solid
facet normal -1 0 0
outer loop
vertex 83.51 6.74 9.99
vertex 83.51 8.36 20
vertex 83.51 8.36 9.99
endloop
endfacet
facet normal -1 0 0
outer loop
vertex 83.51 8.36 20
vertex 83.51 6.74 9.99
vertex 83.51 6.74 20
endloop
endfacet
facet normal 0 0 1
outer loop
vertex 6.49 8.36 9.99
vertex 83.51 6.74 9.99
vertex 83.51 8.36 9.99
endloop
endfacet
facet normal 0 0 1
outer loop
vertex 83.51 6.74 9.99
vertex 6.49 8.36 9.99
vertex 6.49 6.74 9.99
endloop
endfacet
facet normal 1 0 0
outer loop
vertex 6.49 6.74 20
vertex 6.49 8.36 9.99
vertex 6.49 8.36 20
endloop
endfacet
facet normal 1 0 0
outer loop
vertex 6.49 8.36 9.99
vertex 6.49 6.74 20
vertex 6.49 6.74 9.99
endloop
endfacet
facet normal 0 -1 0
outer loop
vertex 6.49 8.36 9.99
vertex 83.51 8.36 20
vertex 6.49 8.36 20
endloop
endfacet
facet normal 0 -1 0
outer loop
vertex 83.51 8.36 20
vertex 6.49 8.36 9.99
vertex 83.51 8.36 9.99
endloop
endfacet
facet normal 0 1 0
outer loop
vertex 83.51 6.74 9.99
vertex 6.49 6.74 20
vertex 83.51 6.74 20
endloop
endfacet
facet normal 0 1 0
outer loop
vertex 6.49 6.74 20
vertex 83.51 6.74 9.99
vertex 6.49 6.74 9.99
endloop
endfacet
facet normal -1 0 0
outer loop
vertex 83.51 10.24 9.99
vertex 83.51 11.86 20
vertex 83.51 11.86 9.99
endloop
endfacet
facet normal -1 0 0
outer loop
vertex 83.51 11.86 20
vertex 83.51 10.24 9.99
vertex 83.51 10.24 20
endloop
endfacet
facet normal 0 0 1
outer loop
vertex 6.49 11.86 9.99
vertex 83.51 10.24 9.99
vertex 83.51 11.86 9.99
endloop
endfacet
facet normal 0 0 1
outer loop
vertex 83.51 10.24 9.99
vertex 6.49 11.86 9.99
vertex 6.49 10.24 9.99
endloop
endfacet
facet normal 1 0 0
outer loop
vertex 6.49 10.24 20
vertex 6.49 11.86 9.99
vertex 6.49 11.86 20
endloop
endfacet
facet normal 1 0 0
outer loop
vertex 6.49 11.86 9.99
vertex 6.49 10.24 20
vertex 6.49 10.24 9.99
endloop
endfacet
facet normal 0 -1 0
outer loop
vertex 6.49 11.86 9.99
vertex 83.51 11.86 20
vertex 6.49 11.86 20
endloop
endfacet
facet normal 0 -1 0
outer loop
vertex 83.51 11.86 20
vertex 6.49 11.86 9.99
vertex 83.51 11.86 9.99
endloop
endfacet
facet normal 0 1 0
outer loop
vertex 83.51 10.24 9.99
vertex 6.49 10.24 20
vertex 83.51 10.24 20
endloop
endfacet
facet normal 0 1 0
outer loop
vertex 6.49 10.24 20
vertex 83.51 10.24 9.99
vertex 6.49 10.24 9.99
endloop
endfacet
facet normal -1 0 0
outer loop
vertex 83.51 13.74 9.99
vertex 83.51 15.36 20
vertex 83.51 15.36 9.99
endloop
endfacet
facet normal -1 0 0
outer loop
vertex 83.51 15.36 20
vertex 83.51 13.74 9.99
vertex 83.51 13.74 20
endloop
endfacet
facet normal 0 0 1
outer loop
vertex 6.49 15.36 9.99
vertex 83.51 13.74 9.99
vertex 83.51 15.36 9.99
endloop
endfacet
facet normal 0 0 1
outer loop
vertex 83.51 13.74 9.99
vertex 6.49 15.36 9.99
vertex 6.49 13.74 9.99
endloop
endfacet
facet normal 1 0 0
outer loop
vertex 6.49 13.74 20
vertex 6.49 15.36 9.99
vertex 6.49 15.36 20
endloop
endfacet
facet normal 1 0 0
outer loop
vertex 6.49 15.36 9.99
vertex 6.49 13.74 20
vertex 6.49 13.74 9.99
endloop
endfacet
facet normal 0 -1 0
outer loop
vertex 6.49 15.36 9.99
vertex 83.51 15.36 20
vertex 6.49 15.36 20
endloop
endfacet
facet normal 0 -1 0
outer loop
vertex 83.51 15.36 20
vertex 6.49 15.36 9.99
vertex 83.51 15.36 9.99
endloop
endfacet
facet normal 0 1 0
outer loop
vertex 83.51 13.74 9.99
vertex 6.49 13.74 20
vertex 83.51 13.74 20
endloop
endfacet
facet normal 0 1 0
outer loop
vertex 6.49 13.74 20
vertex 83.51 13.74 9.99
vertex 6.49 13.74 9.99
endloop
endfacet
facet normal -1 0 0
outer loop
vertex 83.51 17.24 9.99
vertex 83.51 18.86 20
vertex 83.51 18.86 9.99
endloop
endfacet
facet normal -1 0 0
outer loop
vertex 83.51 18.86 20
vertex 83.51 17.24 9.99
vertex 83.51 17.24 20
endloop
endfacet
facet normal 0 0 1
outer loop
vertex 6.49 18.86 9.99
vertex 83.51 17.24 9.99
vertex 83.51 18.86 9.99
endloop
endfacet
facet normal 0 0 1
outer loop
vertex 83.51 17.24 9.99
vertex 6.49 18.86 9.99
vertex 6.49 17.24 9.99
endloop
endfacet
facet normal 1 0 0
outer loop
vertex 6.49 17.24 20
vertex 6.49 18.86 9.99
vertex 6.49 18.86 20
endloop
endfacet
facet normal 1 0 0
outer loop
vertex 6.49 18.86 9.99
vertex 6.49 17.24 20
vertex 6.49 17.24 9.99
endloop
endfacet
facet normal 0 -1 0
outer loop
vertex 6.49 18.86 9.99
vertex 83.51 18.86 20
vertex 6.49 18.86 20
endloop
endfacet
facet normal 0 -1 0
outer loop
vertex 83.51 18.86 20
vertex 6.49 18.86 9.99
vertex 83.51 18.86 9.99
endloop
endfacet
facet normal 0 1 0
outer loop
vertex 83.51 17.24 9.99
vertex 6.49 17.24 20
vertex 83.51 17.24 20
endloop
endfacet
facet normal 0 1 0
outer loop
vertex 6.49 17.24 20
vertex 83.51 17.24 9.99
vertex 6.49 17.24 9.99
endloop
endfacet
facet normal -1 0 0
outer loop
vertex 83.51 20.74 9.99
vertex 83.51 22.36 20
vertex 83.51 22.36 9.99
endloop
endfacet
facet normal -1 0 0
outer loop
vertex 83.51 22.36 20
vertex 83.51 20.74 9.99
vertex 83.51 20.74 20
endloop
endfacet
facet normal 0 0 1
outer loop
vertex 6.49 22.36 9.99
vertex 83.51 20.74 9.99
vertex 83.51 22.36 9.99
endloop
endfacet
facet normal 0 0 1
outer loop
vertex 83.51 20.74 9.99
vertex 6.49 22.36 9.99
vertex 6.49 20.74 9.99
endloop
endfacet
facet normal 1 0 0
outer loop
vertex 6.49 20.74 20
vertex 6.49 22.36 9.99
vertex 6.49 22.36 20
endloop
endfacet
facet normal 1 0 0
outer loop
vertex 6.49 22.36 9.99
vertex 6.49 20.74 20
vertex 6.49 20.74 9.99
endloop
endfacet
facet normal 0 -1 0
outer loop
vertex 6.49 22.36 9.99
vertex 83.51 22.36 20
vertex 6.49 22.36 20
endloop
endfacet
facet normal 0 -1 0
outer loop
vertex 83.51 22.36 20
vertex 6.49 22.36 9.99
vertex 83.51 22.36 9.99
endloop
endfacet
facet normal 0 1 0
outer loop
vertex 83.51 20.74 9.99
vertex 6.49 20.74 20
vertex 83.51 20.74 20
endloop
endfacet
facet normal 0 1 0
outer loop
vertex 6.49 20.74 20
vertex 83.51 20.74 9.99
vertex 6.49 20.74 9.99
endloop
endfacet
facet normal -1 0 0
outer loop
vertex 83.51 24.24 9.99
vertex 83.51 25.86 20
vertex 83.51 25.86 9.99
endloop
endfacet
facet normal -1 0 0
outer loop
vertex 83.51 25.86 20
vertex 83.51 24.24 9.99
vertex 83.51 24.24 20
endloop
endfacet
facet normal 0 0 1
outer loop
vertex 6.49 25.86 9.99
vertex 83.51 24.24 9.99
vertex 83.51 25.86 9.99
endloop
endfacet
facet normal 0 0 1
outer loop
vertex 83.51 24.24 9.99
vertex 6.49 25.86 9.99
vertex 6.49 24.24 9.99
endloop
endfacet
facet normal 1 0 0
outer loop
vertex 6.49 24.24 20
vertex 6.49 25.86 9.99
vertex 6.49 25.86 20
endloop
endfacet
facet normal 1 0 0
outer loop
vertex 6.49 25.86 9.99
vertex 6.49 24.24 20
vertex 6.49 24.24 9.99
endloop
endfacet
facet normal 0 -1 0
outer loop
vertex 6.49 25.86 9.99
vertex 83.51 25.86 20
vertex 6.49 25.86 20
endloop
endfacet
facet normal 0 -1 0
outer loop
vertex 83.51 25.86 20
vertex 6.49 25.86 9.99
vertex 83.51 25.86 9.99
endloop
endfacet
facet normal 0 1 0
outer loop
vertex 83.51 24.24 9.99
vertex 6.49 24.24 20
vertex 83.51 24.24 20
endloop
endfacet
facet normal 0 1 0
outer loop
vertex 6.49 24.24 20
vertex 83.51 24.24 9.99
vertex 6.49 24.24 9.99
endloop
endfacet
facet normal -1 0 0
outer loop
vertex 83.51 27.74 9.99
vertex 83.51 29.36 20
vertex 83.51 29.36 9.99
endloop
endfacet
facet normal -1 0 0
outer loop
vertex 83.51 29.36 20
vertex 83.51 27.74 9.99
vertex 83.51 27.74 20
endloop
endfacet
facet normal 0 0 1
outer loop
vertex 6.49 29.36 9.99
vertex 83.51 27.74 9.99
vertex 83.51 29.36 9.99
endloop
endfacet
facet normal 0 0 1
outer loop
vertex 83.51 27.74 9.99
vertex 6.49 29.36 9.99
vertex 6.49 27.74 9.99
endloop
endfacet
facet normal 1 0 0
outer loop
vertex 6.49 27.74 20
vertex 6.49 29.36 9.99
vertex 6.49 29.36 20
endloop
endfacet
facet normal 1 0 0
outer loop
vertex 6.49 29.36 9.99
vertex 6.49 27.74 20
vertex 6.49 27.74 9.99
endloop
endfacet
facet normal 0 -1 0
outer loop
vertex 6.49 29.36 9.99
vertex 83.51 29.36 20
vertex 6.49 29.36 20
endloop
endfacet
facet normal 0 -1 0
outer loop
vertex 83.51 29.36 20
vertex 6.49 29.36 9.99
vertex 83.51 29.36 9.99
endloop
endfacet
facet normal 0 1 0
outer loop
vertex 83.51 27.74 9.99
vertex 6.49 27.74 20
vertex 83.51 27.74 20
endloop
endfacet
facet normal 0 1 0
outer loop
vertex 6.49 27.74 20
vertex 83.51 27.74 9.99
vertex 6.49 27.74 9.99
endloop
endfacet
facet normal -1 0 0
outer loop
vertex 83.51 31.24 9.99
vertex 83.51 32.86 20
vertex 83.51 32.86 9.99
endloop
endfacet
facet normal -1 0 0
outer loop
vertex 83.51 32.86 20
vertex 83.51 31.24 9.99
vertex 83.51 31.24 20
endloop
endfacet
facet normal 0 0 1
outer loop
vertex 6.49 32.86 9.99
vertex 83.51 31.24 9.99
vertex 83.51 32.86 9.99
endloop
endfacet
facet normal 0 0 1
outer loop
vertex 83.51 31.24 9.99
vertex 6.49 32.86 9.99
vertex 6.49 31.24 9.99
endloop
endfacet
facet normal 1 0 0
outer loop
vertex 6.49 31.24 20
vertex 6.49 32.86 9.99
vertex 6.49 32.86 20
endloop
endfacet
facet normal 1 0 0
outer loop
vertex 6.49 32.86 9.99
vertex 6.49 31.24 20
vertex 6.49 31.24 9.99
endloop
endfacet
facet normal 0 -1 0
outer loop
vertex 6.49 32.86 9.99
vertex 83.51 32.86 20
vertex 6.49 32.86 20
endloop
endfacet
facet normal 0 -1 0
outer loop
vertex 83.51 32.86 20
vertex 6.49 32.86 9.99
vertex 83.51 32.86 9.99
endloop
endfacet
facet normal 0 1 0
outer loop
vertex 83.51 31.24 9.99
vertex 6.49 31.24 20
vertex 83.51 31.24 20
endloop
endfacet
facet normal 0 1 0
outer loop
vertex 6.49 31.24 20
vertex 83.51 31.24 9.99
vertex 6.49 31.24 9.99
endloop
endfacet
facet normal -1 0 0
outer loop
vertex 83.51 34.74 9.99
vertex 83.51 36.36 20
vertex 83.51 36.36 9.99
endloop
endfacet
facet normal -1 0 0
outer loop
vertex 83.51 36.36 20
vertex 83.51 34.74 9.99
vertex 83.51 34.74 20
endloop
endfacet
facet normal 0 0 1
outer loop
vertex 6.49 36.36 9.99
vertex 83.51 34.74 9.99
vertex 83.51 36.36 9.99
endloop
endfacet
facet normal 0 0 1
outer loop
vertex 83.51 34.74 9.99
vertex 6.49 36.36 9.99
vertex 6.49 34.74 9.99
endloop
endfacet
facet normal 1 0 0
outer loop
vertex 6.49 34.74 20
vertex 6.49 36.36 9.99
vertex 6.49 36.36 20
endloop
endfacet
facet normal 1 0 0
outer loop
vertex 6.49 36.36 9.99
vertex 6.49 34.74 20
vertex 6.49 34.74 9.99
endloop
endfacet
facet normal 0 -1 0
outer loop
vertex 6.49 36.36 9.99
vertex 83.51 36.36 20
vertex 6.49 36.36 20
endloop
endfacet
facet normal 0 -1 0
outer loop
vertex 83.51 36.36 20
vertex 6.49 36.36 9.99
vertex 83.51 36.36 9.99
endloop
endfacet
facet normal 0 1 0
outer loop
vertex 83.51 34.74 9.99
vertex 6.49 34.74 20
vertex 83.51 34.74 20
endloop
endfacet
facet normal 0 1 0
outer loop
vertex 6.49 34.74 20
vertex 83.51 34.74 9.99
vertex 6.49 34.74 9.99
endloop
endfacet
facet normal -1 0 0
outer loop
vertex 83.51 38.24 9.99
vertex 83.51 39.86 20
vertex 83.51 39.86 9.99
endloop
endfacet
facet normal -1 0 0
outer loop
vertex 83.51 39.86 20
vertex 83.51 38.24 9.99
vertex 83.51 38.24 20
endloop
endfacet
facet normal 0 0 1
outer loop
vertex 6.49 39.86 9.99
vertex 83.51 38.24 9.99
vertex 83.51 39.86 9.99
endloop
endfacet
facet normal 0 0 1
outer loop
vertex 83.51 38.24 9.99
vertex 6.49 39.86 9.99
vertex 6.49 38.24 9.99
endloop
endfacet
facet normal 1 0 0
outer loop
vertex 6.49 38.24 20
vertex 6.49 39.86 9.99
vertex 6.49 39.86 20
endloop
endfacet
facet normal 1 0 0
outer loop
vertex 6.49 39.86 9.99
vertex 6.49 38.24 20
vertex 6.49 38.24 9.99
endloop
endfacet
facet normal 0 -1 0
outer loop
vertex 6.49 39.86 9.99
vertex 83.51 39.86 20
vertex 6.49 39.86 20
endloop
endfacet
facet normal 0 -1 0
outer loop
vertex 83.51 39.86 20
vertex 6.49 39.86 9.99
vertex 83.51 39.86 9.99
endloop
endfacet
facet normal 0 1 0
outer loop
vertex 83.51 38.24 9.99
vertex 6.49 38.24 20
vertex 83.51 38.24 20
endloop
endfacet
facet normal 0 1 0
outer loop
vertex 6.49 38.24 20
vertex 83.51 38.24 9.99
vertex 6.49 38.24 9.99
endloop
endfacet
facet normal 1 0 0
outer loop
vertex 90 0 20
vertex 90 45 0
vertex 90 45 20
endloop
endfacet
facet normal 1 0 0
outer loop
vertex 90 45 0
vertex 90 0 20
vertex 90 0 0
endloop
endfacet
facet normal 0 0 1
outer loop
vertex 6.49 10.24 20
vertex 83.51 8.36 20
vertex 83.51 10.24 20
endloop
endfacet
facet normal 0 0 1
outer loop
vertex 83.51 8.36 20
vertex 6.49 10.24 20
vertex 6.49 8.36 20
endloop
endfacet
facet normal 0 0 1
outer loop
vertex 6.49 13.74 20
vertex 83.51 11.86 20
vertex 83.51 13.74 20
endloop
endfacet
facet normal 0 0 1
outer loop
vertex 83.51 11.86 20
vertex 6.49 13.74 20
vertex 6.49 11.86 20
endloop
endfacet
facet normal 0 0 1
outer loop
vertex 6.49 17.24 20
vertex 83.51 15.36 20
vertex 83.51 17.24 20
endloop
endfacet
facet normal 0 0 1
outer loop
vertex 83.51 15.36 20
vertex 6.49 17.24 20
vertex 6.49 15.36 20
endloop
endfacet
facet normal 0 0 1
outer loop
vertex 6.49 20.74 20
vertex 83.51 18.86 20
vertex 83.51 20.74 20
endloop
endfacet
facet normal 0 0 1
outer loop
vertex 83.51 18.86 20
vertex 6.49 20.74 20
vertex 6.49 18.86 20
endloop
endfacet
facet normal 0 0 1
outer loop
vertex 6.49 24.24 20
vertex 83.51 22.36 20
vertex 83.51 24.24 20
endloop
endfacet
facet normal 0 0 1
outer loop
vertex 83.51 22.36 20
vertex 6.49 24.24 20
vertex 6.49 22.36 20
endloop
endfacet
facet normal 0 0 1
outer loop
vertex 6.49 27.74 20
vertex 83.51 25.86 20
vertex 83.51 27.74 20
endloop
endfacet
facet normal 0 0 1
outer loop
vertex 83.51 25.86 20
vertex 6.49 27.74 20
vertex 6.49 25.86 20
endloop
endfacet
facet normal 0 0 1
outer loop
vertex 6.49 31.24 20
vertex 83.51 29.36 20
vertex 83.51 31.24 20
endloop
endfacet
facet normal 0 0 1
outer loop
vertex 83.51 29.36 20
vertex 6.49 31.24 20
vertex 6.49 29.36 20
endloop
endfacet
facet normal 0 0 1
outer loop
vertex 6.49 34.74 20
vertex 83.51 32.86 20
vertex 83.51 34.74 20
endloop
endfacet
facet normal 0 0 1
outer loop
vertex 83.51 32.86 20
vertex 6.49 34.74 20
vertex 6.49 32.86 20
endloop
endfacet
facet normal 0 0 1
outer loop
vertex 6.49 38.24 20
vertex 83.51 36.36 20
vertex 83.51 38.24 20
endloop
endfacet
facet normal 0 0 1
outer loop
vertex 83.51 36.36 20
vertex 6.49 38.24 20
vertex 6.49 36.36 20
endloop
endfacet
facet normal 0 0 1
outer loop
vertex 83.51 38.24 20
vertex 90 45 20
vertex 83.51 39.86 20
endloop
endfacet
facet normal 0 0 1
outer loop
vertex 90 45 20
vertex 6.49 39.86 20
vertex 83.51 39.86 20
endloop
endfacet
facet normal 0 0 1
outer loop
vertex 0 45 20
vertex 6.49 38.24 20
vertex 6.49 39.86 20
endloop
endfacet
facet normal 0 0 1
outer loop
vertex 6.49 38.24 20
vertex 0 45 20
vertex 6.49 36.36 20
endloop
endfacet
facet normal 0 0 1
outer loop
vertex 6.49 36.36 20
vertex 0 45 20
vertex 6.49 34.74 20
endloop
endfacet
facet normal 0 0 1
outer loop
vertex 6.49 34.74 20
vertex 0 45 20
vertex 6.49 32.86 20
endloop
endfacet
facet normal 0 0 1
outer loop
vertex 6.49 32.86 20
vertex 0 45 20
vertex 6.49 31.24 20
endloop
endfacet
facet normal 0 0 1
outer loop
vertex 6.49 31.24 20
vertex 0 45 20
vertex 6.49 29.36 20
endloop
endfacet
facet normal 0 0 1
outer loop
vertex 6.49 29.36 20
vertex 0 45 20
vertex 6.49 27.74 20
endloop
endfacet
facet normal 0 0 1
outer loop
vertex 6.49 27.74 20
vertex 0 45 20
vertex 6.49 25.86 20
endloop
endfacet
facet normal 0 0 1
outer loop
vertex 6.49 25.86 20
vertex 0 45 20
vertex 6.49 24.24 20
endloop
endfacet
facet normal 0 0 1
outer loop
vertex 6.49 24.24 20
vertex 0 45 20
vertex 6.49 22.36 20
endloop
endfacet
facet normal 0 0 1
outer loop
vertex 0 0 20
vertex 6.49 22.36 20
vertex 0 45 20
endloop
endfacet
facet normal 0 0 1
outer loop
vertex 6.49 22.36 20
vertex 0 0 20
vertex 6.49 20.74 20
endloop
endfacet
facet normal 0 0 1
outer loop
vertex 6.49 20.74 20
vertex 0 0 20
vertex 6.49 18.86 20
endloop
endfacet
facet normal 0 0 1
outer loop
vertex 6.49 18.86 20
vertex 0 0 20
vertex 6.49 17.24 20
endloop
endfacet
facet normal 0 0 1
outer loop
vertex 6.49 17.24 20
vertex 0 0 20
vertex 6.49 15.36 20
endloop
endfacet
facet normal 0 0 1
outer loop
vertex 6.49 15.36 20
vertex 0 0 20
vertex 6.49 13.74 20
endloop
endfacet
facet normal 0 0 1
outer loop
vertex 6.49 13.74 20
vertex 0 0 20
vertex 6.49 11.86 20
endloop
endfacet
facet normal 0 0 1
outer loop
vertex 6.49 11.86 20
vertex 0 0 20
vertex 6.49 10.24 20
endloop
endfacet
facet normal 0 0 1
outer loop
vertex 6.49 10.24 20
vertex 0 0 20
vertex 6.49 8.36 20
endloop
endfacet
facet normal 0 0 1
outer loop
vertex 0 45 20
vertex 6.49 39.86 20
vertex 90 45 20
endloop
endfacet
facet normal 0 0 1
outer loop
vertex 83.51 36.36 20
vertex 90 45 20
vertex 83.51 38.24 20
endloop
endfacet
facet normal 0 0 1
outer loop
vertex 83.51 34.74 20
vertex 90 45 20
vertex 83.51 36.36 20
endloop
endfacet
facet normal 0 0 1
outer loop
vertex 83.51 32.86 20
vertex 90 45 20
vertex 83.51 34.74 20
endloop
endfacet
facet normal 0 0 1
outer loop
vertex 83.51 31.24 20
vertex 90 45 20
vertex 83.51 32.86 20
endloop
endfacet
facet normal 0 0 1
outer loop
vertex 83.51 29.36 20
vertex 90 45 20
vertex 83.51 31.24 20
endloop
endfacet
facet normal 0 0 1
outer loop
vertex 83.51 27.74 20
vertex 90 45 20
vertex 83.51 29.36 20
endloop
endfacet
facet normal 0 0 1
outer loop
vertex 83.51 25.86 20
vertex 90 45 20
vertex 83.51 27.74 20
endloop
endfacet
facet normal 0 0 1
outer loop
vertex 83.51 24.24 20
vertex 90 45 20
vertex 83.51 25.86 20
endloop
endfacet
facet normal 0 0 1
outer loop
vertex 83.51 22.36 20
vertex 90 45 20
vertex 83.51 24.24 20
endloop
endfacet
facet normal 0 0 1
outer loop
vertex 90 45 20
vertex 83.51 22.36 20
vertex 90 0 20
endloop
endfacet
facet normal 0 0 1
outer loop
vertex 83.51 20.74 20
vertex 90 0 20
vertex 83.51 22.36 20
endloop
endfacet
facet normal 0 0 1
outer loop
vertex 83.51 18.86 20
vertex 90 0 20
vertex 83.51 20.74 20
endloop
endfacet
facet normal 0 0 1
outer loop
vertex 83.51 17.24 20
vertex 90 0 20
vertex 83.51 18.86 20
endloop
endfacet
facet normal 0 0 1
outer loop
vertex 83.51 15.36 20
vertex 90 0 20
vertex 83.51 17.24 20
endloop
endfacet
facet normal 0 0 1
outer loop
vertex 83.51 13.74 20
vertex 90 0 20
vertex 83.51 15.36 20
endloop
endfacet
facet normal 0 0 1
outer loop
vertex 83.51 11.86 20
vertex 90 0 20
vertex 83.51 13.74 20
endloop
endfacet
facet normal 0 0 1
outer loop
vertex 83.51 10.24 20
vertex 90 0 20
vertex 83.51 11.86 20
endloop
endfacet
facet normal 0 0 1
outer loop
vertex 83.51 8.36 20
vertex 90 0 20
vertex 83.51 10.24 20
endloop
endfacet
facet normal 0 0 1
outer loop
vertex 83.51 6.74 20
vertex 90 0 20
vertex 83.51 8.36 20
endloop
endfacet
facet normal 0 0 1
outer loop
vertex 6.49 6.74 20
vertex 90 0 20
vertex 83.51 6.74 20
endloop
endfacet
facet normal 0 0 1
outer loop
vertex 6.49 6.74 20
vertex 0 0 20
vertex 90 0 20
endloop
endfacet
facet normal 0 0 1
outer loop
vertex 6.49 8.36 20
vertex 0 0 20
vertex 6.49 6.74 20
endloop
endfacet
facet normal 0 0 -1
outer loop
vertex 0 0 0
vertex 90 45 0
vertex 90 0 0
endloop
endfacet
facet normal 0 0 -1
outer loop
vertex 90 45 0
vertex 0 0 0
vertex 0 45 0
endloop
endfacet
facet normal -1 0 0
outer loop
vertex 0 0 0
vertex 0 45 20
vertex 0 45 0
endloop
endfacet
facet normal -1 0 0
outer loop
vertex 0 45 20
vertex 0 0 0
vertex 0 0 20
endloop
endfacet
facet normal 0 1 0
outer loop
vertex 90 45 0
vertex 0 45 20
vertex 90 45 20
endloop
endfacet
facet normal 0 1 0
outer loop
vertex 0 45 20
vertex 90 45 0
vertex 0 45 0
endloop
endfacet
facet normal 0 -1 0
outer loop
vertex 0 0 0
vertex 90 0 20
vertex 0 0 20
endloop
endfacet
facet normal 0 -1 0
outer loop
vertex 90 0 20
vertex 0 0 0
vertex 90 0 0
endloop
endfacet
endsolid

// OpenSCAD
// Drying rack for 10 microscope slides
// Slide dimensions: 75 x 25 x 1 mm (L x W x T)
// Base dimensions: 90 x 45 x 20 mm (X x Y x Z)
// Slots: 10 parallel slots, 77 mm long (X), 1.6 mm wide (Y), 10 mm deep (Z)
// Slot spacing: 3.5 mm centre-to-centre in Y
// Slots centred on block in X and Y

// Base dimensions
base_length = 90;   // X
base_width  = 45;   // Y
base_height = 20;   // Z

// Slot dimensions
num_slots   = 10;
slot_length = 77;   // X
slot_width  = 1.6;  // Y
slot_depth  = 10;   // Z
slot_pitch  = 3.5;  // Y spacing between centres

// Slot positioning calculations
// First slot centre Y position (group of centres centred in Y)
first_slot_centre_y = (base_width - (num_slots - 1) * slot_pitch) / 2;
// Slot offset from front edge in X (slots are 77 mm long, block is 90 mm long)
slot_offset_x = (base_length - slot_length) / 2;

// Base block
module base_block() {
    cube([base_length, base_width, base_height]);
}

// Slot module - must be defined after variables are set
module slot(x_offset, y_offset) {
    // Cut from z = base_height - slot_depth to base_height
    // Extend 0.01 mm past all faces for clean cutting
    translate([x_offset - 0.01, y_offset - 0.01, base_height - slot_depth - 0.01])
        cube([slot_length + 0.02, slot_width + 0.02, slot_depth + 0.02]);
}

// Build the rack
difference() {
    base_block();
    // Generate slots with for loop
    for (i = [0 : num_slots - 1]) {
        // Calculate Y position of each slot centre
        y_pos = first_slot_centre_y + i * slot_pitch;
        // Translate slot to position
        slot(slot_offset_x, y_pos);
    }
}

// Set resolution for smooth curves
$fn = 64;
